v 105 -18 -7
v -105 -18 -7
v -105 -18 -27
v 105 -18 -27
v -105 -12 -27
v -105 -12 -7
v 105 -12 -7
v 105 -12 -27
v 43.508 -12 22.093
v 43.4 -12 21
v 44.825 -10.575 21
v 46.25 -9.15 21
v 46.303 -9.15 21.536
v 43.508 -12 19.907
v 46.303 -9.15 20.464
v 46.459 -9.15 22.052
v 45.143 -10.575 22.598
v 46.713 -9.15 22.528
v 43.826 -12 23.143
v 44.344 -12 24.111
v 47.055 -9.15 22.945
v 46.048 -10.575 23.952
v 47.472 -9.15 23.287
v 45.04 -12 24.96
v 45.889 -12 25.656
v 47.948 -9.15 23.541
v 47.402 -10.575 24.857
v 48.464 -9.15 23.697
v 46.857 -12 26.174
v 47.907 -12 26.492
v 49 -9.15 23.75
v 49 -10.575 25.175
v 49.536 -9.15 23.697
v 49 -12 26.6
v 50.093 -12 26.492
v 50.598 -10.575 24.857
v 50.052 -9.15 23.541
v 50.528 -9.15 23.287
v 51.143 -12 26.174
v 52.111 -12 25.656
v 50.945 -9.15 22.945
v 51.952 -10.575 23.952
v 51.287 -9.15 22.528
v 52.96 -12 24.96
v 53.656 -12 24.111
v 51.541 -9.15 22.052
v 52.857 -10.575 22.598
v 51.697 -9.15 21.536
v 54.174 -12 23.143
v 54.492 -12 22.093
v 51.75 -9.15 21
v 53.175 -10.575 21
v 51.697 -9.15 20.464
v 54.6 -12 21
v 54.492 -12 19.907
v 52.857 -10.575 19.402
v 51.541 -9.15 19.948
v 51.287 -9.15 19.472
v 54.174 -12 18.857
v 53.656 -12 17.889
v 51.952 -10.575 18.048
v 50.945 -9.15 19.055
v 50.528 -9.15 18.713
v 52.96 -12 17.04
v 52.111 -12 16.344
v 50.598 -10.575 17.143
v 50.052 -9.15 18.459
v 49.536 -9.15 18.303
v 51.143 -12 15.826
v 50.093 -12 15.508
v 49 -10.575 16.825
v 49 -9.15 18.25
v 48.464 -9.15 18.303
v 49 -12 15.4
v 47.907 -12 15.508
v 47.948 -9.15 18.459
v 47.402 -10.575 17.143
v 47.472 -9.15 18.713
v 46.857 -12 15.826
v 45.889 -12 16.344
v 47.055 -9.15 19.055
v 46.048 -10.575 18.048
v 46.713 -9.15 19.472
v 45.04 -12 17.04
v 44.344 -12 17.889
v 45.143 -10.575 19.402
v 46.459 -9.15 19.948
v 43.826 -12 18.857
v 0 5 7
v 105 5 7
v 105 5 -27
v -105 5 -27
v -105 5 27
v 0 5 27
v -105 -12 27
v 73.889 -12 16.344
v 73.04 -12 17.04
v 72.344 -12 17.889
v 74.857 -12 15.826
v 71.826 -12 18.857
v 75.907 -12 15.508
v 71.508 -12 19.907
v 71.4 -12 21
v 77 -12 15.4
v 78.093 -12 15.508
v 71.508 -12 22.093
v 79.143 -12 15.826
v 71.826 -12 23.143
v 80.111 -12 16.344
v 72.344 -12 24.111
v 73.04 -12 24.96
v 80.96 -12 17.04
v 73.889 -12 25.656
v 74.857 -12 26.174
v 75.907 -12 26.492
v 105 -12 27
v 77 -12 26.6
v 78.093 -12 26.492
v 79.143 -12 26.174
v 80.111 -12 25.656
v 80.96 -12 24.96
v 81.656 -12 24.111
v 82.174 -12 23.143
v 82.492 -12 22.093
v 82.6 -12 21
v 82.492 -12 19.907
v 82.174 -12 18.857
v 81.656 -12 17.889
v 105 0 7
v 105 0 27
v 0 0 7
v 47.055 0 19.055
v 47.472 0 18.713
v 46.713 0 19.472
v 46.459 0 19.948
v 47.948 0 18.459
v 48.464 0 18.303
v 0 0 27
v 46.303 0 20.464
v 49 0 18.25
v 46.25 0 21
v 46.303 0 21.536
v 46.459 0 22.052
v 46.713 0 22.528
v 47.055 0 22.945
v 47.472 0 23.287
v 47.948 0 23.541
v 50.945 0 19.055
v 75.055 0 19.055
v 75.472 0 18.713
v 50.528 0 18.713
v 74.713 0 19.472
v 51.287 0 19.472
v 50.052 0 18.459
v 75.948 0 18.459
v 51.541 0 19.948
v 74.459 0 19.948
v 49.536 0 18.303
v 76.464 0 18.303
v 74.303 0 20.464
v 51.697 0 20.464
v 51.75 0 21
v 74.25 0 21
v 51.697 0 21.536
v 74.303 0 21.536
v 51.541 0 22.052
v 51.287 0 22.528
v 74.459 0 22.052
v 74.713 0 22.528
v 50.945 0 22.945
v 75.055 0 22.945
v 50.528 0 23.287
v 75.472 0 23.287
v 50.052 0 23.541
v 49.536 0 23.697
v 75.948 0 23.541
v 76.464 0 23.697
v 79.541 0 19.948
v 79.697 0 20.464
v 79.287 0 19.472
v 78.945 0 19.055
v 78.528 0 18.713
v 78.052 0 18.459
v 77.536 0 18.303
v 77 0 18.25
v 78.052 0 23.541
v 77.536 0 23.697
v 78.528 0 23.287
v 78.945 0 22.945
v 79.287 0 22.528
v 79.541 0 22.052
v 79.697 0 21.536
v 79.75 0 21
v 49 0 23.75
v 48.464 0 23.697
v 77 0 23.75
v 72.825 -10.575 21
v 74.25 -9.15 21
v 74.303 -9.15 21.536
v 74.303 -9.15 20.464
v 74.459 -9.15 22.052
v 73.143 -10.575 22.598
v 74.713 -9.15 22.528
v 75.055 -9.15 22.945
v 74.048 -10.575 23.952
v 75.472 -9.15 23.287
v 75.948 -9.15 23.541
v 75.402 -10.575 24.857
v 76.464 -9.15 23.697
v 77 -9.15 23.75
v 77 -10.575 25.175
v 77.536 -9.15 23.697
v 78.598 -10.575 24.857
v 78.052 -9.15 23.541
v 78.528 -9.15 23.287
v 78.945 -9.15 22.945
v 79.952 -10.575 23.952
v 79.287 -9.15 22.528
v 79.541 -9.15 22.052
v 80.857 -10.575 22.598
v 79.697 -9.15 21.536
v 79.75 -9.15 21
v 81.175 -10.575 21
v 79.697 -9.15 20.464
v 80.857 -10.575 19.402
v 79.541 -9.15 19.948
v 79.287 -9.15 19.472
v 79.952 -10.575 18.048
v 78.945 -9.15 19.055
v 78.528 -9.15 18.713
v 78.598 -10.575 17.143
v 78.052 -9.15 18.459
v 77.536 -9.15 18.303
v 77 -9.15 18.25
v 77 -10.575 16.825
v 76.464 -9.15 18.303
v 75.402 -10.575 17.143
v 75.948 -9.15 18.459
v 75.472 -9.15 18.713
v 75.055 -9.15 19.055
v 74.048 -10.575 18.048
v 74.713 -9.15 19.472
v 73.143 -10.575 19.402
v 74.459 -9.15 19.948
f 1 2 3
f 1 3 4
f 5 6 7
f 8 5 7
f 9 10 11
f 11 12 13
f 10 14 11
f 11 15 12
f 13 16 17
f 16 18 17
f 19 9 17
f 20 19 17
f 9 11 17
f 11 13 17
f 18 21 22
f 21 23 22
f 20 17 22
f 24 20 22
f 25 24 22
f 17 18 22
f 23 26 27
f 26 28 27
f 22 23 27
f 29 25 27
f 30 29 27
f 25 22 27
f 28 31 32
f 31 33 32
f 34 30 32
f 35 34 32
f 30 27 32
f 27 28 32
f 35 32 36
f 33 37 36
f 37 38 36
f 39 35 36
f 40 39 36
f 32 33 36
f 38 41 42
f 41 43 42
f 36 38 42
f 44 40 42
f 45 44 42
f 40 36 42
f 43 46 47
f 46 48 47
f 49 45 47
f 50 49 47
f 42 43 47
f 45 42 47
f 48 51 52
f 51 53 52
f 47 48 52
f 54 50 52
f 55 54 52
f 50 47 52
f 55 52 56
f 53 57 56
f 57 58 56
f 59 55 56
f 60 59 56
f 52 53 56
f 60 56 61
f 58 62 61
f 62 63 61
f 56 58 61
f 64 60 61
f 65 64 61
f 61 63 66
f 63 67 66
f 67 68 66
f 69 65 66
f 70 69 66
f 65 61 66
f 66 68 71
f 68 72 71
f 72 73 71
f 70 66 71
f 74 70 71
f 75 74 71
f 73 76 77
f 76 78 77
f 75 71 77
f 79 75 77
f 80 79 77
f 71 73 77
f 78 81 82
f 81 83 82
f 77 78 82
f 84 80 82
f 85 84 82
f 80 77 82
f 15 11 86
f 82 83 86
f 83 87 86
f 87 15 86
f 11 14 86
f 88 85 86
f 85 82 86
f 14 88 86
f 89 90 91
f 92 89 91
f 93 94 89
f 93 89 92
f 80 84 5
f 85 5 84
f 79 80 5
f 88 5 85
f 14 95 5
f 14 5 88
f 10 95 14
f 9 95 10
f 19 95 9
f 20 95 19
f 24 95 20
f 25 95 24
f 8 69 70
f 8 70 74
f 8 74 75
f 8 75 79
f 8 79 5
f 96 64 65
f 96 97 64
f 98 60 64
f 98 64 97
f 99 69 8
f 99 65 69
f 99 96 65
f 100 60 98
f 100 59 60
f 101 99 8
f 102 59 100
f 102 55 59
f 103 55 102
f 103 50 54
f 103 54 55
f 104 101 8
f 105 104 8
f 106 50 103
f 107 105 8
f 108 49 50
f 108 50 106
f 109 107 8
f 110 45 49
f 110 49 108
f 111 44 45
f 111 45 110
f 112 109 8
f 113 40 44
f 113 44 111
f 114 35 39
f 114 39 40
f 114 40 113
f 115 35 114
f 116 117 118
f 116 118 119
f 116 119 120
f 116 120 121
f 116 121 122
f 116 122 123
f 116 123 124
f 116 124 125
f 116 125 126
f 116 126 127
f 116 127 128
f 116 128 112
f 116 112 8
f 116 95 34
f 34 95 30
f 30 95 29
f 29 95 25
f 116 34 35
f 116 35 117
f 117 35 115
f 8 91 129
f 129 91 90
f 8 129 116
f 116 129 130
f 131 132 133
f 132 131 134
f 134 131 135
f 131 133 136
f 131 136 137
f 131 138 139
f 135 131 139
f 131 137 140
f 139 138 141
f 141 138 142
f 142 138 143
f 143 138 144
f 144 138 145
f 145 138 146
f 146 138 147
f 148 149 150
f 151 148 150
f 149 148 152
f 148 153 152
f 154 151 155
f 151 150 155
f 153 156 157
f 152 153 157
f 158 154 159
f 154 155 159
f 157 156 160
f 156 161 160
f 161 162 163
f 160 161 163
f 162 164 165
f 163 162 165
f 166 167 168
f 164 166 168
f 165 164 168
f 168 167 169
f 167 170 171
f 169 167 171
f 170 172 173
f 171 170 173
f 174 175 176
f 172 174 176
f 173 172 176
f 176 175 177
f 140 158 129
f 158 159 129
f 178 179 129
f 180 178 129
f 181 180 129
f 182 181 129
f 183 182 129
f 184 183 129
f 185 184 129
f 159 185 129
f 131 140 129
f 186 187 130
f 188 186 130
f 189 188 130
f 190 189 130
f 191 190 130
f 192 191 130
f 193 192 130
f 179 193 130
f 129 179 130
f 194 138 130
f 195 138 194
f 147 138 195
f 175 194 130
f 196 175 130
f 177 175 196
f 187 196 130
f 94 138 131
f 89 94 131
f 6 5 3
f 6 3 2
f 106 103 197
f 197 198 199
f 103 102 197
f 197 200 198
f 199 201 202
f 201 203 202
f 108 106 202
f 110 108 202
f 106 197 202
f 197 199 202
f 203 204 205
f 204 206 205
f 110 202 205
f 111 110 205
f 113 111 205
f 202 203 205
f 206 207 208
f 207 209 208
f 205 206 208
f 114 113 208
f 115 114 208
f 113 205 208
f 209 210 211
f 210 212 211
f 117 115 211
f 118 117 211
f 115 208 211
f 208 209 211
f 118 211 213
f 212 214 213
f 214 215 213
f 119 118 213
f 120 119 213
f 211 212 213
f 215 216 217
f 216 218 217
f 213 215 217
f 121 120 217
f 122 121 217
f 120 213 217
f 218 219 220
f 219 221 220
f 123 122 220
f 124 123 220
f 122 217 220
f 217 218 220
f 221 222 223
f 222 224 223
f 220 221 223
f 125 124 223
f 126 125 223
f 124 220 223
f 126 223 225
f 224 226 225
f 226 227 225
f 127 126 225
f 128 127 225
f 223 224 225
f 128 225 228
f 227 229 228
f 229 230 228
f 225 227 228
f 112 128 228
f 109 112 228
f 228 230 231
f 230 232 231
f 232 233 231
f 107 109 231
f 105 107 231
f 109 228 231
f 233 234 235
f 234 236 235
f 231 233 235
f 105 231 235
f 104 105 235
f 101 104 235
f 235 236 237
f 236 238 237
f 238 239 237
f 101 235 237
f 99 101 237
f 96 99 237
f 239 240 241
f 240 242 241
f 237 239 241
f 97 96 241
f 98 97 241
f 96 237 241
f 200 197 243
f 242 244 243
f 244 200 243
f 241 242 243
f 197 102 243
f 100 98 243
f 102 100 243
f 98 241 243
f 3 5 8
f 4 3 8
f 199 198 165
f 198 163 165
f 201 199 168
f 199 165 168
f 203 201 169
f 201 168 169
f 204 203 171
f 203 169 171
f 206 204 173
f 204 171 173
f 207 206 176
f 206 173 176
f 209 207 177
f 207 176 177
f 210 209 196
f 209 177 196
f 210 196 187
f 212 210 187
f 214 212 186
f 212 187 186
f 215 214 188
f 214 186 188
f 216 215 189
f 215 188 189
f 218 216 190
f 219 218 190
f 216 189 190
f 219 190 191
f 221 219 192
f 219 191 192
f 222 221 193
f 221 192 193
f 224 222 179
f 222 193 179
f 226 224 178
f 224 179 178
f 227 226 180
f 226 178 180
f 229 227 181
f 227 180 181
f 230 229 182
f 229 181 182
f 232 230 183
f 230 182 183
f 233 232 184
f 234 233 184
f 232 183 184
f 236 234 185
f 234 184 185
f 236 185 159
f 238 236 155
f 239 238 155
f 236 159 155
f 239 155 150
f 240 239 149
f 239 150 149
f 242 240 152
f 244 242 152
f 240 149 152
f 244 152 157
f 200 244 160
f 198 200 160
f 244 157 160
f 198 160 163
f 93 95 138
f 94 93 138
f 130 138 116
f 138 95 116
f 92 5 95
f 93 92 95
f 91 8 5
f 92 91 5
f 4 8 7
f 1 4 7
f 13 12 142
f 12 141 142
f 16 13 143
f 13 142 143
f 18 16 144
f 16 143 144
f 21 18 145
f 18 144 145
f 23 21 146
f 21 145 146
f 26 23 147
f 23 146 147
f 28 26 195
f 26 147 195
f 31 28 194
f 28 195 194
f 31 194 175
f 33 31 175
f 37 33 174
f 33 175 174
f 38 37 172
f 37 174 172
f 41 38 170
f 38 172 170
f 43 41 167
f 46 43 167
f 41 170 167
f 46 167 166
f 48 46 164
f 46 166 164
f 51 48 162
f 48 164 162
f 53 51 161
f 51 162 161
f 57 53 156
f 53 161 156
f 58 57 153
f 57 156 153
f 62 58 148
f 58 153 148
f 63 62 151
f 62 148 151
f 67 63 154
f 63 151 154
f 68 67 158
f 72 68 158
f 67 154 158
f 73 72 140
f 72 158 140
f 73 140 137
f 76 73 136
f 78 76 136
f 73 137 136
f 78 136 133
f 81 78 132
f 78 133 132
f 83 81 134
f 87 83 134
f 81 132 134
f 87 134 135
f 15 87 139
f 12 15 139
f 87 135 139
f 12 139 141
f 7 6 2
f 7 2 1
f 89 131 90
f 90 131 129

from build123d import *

# Parameters (mm, degrees)
F0_W           = 210
F0_H           = 54
F1_DEPTH       = 12
F3_DEPTH       = 5
F5_D           = 5.5
F5_CSINK_D     = 11.2
F5_CSINK_ANGLE = 90
F6_W           = 210
F6_H           = 20
F7_DEPTH       = 6


with BuildPart() as f1:
    # F0 (on Front) → F1 (new body)
    with BuildSketch(Plane.XZ):
        Rectangle(F0_W, F0_H)
    extrude(amount=F1_DEPTH)

    # F2 (on face) → F3 (join)
    with BuildSketch(Plane(origin=(0, 0, 0), x_dir=(-1, 0, 0), z_dir=(0, 1, 0))):
        Polygon((105, 27), (0, 27), (0, 7), (-105, 7), (-105, -27), (105, -27), align=None)
    extrude(amount=F3_DEPTH)

    # F5 (through all)
    with Locations(Plane.XZ.offset(12)):
        with Locations((49, 21), (77, 21)):
            CounterSinkHole(F5_D / 2, F5_CSINK_D / 2, counter_sink_angle=F5_CSINK_ANGLE)


with BuildPart() as f7:
    # F6 (on face) → F7 (new body)
    with BuildSketch(Plane.XZ.offset(12)):
        with Locations((0, -17)):
            Rectangle(F6_W, F6_H)
    extrude(amount=F7_DEPTH)


solid = Compound([f1.part, f7.part])
